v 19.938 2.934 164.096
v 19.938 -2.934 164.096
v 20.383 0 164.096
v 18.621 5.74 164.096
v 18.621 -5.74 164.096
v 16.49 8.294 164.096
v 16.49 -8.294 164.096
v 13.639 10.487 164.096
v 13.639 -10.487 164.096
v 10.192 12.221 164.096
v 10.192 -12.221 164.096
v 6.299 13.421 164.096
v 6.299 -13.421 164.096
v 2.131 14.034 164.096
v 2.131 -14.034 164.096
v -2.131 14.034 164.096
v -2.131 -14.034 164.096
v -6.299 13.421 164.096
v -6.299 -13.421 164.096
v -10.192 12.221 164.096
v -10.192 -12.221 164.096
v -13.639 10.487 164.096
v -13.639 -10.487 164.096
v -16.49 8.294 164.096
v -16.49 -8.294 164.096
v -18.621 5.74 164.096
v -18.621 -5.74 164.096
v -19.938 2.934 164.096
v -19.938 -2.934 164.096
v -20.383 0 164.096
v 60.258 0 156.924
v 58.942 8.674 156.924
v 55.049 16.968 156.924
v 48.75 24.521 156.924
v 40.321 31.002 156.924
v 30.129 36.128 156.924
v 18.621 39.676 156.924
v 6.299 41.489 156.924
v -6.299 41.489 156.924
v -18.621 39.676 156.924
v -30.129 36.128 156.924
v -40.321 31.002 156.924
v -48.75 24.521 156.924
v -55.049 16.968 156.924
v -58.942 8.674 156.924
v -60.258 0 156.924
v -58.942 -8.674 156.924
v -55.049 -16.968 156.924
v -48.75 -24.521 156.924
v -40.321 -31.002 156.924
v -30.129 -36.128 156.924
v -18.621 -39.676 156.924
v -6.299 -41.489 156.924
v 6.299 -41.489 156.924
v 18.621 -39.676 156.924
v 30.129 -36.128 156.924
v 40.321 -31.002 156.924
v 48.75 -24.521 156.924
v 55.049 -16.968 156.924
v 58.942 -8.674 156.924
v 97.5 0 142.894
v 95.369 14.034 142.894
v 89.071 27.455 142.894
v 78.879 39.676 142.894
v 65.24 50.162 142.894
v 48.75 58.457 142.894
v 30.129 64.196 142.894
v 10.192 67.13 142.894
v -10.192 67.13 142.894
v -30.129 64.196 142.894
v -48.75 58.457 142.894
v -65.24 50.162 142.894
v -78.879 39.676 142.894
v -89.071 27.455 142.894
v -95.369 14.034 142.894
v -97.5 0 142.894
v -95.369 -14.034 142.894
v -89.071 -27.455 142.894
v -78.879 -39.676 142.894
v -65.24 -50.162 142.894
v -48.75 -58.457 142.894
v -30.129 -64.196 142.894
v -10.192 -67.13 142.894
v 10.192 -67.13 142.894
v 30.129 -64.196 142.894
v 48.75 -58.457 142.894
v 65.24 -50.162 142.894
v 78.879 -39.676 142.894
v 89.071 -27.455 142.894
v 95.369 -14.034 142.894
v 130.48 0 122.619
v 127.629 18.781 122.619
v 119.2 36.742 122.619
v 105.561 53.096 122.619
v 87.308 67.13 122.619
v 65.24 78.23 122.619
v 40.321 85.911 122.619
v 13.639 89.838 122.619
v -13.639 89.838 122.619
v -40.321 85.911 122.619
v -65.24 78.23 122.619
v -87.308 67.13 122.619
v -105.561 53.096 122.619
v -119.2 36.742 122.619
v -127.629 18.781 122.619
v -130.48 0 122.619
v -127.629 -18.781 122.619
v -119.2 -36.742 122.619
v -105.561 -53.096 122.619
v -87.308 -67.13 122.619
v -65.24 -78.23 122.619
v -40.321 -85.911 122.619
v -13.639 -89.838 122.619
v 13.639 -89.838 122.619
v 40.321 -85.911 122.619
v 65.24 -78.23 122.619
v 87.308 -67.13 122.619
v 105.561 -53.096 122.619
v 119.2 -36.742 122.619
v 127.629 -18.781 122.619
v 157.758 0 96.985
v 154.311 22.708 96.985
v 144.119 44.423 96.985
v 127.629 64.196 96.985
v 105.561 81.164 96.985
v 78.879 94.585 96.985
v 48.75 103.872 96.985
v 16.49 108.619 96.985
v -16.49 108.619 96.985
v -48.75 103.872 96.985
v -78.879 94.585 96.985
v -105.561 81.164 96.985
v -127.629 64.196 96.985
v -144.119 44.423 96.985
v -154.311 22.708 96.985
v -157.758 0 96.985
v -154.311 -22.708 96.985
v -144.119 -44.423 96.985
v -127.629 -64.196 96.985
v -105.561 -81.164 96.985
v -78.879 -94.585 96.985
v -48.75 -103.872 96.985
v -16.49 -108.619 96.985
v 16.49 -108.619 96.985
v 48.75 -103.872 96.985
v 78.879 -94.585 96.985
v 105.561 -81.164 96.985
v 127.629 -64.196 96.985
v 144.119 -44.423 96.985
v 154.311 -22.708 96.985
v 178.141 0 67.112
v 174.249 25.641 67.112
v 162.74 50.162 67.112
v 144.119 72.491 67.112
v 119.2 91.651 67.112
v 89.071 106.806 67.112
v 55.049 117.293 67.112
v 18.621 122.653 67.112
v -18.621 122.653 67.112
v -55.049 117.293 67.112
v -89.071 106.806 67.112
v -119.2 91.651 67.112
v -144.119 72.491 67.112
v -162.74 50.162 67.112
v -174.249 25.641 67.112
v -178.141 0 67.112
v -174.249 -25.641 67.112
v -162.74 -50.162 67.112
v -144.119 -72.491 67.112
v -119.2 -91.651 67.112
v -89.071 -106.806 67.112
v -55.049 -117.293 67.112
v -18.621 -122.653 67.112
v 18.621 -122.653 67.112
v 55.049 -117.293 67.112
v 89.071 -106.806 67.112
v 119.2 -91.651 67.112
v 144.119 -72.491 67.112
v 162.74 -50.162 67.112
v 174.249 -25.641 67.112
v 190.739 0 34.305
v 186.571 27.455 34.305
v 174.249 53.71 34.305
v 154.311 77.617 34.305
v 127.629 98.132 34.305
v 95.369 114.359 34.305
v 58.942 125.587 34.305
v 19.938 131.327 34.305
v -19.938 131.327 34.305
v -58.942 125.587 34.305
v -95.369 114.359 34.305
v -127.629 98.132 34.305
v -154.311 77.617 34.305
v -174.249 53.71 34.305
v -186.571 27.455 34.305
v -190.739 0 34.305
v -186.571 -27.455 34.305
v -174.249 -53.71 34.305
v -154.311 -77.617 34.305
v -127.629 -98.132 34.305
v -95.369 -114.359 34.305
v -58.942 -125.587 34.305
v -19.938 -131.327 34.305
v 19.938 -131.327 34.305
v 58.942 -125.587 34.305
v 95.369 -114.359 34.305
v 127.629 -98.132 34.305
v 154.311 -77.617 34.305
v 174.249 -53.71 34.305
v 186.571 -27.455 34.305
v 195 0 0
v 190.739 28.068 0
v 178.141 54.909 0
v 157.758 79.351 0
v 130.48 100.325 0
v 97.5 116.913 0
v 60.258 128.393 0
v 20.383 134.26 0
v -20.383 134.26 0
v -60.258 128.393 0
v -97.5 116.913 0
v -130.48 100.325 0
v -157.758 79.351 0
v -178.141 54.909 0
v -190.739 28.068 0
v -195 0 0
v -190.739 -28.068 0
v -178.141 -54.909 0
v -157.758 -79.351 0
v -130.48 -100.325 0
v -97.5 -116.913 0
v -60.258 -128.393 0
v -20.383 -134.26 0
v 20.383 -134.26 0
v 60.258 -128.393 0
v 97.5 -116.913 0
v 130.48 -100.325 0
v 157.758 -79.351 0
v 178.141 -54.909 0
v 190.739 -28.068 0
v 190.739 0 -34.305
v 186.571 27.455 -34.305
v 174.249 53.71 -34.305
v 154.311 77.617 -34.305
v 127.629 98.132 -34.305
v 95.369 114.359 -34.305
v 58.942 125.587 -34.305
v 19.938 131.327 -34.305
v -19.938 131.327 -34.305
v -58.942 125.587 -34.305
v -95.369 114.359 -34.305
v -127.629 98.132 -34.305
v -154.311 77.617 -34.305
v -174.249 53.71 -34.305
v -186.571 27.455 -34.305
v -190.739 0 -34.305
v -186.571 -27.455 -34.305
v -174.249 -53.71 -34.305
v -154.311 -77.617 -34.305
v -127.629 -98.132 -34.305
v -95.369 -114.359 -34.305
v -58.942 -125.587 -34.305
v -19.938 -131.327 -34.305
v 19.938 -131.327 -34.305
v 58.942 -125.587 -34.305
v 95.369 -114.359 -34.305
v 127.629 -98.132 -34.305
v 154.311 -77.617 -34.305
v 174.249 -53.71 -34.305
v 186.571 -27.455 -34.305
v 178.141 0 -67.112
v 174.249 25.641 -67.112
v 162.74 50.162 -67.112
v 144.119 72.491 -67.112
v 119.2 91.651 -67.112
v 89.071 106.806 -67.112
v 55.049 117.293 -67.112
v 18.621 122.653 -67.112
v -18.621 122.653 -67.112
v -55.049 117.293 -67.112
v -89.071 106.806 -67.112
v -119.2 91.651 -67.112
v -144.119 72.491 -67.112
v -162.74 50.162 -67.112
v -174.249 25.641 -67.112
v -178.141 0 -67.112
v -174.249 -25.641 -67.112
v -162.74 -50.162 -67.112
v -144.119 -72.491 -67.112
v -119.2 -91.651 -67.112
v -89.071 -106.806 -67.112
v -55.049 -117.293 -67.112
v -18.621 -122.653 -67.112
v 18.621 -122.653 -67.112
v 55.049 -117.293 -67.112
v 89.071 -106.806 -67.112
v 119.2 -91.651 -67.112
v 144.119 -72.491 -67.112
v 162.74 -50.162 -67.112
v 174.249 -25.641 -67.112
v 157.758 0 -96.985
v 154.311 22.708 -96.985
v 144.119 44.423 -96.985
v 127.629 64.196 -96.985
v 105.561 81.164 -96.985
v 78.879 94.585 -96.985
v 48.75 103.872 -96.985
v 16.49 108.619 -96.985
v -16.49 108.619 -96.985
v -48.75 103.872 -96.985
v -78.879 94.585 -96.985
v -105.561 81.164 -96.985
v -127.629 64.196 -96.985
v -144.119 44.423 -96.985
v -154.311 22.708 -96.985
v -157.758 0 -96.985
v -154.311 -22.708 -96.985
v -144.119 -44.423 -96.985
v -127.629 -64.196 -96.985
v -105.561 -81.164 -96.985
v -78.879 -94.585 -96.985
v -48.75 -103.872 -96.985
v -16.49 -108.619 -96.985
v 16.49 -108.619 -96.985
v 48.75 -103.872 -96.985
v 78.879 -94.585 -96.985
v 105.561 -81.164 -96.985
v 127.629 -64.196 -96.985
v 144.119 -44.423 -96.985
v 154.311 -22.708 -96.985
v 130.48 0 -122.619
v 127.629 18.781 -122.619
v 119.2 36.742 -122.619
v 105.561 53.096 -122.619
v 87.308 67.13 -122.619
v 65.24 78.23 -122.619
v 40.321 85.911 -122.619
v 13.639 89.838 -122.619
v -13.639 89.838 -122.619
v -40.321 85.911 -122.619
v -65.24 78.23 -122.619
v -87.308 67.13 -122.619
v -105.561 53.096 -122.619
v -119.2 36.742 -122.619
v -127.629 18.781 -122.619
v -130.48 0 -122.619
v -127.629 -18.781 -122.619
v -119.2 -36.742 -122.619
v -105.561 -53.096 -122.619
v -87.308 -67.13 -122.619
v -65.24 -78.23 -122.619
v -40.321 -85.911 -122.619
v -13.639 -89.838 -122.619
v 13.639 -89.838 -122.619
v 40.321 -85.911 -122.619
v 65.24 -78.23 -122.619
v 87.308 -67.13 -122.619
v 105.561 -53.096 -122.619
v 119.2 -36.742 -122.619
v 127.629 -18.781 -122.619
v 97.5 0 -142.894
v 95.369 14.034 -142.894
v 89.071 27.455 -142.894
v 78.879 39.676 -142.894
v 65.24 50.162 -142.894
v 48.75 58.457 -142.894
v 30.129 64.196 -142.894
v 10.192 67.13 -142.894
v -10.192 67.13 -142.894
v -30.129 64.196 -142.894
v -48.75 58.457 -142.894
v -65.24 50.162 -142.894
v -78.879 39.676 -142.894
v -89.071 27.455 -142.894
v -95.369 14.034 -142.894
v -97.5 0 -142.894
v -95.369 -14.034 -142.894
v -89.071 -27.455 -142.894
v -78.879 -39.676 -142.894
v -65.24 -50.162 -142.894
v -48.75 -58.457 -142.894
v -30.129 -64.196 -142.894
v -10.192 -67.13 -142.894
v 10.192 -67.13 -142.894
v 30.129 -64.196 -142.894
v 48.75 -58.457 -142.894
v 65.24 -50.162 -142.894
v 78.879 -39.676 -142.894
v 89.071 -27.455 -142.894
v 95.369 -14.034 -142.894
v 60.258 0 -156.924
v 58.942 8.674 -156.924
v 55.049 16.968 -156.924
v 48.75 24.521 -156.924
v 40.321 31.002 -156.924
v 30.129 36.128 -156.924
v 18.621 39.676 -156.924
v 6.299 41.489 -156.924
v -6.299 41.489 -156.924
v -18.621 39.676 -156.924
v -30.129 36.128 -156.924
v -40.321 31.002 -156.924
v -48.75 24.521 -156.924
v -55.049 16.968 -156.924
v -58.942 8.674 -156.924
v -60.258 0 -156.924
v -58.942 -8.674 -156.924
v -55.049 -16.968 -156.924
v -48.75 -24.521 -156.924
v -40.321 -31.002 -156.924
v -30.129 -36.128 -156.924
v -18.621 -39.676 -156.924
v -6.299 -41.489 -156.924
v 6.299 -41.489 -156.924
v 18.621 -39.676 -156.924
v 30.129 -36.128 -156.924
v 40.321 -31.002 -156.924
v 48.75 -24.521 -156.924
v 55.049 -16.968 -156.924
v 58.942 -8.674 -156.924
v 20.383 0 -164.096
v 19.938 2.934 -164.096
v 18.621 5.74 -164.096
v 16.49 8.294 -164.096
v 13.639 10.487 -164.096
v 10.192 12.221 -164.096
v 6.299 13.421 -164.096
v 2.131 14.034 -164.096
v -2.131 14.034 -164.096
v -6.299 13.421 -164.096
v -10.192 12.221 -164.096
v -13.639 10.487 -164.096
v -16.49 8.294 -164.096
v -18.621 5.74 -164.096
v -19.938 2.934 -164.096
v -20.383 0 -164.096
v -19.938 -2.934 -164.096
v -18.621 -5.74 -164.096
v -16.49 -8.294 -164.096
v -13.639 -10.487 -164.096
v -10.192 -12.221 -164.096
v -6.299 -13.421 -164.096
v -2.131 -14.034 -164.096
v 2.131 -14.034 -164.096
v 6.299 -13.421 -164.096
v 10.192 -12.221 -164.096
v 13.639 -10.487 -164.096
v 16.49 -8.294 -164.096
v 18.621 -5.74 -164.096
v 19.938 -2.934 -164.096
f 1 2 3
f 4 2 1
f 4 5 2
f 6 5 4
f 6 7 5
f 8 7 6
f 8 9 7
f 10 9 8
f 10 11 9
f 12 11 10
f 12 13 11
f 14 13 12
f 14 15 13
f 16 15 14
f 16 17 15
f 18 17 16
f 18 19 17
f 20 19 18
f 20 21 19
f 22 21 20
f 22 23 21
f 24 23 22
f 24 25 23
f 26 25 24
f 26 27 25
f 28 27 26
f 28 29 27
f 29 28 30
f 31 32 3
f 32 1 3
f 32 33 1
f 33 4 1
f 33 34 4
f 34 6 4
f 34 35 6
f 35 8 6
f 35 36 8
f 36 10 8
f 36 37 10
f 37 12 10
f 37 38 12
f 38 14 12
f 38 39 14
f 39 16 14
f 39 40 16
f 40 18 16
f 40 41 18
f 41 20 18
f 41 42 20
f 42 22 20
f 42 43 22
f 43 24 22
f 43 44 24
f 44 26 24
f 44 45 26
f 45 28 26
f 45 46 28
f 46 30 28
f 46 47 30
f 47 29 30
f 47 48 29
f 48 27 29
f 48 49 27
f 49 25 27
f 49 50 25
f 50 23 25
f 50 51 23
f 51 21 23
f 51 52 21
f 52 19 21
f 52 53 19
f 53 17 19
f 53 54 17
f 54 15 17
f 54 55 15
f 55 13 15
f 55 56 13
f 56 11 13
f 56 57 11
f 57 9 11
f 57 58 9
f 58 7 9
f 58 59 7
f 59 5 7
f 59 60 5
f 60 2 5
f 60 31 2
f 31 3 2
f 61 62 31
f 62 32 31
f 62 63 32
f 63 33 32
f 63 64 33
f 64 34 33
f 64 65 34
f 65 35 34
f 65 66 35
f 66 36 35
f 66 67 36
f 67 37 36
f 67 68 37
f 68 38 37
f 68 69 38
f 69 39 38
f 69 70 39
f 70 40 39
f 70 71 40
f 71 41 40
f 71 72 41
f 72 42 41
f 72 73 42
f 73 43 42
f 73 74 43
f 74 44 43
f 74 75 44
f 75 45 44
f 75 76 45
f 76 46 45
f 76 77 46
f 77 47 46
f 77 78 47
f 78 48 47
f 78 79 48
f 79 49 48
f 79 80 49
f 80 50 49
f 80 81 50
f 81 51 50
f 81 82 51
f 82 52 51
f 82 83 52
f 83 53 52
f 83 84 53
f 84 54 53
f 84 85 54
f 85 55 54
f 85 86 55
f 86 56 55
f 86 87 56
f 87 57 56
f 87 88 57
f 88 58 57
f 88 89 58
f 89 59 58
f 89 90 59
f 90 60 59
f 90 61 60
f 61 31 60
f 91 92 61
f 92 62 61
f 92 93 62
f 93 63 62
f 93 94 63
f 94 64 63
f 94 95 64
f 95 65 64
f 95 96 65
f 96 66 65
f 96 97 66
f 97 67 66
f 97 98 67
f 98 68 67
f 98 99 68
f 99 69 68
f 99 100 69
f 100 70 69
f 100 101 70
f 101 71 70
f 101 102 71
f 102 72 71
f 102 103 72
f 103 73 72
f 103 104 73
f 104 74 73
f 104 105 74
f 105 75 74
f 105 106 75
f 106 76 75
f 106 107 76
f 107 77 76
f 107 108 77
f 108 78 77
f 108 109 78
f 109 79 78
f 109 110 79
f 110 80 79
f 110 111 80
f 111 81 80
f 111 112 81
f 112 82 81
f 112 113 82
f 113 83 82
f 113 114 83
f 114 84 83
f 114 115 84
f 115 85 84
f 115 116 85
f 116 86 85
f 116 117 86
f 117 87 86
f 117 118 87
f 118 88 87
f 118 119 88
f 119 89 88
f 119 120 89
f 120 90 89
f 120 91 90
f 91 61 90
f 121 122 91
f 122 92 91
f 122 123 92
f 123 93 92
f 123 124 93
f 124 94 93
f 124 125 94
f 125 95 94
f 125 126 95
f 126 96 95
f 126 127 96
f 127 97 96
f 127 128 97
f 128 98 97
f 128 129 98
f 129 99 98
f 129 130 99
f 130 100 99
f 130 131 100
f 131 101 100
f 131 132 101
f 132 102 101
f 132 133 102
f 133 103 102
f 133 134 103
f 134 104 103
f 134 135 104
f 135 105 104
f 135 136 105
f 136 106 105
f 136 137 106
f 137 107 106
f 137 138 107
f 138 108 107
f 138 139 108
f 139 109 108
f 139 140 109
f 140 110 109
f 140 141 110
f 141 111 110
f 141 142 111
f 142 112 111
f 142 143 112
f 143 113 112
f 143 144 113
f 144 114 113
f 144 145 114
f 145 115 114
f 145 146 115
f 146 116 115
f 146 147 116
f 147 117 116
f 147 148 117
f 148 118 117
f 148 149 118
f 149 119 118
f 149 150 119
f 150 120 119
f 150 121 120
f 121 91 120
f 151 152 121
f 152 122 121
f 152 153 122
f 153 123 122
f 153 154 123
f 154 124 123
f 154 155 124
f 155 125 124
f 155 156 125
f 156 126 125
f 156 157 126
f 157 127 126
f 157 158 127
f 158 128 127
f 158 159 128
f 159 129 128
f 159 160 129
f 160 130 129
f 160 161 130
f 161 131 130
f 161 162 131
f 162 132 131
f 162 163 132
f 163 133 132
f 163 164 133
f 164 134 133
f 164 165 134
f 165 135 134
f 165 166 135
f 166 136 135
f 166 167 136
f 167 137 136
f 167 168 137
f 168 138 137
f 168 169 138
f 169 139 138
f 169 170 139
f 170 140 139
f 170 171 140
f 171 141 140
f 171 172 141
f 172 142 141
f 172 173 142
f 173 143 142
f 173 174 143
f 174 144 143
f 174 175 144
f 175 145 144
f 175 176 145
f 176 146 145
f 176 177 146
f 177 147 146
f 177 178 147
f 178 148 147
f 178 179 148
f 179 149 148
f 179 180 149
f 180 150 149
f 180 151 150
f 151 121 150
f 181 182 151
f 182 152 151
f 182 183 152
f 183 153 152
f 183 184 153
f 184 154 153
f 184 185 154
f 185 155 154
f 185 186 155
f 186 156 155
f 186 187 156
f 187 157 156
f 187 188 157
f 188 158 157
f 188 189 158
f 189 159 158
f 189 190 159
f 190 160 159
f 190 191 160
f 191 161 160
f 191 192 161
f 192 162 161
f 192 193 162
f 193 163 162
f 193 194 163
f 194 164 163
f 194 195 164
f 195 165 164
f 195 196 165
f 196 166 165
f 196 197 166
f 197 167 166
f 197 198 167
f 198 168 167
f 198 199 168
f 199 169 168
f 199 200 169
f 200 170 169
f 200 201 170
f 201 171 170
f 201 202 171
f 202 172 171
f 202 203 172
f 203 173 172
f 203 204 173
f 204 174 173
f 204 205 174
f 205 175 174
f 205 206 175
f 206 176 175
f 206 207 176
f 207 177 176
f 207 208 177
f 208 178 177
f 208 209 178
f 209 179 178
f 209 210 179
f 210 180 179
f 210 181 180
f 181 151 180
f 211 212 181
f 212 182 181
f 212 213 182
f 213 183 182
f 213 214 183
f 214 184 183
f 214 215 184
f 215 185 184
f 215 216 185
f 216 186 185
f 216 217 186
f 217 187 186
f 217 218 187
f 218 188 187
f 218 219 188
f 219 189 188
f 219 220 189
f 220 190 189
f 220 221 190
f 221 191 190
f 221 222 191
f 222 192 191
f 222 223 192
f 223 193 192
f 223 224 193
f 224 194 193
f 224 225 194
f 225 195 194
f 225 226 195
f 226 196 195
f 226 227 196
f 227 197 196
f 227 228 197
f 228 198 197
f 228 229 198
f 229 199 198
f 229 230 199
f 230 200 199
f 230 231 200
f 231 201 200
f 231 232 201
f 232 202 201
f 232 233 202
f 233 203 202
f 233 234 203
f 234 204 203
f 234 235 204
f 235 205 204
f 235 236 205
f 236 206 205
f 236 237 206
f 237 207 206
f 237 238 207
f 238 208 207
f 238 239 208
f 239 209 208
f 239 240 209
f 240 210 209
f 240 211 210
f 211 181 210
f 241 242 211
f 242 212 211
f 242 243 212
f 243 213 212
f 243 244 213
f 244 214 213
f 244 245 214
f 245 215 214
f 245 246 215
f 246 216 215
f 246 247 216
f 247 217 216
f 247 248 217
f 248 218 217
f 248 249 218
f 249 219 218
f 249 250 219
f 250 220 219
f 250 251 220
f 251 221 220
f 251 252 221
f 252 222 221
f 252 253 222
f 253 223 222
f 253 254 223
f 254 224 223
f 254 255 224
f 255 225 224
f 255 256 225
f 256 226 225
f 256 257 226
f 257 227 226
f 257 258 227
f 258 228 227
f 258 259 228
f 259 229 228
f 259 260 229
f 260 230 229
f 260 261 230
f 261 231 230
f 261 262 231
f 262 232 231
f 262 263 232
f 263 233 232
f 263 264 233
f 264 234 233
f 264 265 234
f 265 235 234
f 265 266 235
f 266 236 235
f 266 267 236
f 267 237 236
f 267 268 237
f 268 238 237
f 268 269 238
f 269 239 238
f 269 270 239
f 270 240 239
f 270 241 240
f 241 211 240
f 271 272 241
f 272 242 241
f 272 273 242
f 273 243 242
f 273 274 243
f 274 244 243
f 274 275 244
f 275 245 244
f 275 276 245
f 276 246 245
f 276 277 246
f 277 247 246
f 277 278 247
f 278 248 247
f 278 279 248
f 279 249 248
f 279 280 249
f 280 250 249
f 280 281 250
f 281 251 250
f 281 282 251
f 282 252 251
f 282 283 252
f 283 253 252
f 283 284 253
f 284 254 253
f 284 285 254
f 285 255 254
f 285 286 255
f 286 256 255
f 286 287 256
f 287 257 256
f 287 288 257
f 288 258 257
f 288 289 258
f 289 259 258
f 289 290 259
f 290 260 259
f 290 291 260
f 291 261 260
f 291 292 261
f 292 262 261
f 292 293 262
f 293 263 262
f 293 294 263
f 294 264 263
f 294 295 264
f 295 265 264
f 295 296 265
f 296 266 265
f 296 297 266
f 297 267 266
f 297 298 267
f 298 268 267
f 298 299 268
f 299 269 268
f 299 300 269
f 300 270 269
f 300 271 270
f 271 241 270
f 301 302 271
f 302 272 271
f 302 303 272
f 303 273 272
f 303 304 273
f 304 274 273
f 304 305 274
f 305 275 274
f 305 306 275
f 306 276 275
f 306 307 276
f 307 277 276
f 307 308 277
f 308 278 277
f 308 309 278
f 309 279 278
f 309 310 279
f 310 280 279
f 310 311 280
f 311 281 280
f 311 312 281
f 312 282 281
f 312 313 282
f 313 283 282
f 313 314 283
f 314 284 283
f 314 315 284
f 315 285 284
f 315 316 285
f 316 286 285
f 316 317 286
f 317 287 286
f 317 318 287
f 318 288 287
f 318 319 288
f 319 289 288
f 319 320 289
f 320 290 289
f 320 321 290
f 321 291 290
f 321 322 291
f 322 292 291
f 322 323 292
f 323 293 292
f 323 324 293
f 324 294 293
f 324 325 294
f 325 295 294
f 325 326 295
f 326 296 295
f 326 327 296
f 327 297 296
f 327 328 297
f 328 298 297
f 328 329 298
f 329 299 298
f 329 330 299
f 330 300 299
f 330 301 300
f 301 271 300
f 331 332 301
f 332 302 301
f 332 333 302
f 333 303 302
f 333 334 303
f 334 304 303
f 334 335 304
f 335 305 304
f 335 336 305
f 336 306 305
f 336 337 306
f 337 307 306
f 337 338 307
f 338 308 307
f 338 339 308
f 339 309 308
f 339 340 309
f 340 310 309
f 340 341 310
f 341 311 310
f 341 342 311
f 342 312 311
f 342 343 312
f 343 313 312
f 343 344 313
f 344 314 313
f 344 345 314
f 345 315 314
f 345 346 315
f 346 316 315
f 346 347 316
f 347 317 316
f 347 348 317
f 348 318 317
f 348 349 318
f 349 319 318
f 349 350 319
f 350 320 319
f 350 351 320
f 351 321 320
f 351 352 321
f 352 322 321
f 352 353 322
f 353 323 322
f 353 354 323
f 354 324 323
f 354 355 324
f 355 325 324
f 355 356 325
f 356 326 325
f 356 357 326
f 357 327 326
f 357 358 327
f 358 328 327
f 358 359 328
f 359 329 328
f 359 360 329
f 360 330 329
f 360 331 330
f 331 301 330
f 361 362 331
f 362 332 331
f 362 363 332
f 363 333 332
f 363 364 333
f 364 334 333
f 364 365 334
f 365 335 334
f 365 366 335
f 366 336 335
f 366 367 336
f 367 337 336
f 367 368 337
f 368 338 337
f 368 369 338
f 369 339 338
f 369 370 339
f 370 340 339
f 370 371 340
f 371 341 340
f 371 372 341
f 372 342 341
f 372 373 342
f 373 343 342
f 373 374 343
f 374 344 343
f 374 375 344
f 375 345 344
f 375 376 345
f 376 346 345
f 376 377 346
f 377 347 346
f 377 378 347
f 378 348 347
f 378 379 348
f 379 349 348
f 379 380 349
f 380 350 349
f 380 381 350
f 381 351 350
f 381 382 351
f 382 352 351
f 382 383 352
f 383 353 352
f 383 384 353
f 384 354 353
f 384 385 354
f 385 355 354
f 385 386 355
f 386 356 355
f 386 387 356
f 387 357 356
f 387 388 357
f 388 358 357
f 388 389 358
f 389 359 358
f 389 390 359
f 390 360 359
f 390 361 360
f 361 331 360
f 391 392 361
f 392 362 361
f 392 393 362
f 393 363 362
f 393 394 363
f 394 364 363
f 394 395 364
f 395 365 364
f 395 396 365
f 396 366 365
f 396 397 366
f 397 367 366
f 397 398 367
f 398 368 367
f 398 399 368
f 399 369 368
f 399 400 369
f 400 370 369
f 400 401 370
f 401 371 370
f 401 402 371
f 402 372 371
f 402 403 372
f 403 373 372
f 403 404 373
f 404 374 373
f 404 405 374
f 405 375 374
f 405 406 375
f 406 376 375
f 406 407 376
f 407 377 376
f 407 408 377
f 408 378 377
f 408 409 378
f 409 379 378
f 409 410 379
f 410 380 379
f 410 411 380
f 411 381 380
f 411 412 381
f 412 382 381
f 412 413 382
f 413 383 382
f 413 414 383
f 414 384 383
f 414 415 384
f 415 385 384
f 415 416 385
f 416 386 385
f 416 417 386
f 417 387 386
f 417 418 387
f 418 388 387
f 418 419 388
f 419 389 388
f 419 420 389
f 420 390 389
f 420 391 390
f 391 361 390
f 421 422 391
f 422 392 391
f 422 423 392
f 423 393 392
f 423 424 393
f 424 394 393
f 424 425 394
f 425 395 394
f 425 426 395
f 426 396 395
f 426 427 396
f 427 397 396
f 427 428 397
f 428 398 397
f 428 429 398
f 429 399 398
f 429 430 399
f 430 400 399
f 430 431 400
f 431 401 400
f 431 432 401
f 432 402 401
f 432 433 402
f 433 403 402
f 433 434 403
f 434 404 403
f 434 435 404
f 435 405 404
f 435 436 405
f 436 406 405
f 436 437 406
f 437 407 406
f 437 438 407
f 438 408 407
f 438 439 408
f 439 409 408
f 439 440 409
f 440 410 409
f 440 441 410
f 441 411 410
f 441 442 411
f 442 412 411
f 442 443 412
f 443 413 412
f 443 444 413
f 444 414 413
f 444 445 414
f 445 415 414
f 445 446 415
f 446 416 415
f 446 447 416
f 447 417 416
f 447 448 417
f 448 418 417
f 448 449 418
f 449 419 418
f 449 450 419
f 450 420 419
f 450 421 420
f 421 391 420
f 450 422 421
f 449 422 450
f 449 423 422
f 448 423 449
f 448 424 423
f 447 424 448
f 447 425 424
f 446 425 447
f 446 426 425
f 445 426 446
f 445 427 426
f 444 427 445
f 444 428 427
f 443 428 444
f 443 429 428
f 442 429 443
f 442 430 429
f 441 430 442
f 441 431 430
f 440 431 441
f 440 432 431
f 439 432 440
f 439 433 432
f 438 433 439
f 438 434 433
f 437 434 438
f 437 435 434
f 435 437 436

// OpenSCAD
// Generated by SolidPython 1.0.1 on 2020-07-29 00:46:50


scale(v = [13, 9, 11]) {
	sphere(r = 15);
}
/***********************************************
*********      SolidPython code:      **********
************************************************
 
# import packages: SolidPython
from solid import *
from solid.utils import *
from itertools import chain, combinations, permutations


class Resize:

    def __init__(self, scad_file):
        self.scad_file = scad_file
        #self.scad_file = import_scad(scad_file)
        # cone/cylinder param:
        self.r1 = 0
        self.r2 = 0
        self.h = 0
        # rectangular prism param:
        self.w = 0
        self.l = 0
        # ellipse param:
        self.r = 0

    # import OpenScad code (file name corresponds to shape)


    # classify shape + parameters
    def assign(self, param1, param2, param3):
        if self.scad_file == 'cone.scad':
            self.r1 = param1
            self.r2 = param2
            self.h = param3
        elif self.scad_file == 'cylinder.scad':
            self.r1 = param1
            self.r2 = param2
            self.h = param3
        elif self.scad_file == 'rectangularPrism.scad':
            self.h = param1
            self.l = param2
            self.w = param3
        else:
            self.r = param1
            self.h = param2

    # resize parameters
    def iterate(self):
        x = range(3, 20, 2)
        i = 1
        if self.scad_file == 'cone.scad':
            tempList = list(permutations(x, 2))
            for temp in tempList:
                param1 = temp[0]
                param2 = temp[1]
                filepath = 'produced_scad_files/' + 'cone' + str(param1) + '_' + str(param2) + '_' + '.scad'
                scad_render_to_file(cylinder(h=param1, r1=param2, r2=0), filepath)

        elif self.scad_file == 'cylinder.scad':
            tempList = list(permutations(x, 3))
            for temp in tempList:
                param1 = temp[0]
                param2 = temp[1]
                filepath = 'produced_scad_files/' + 'cylinder' + str(param1) + '_' + str(param2) + '_' + '.scad'
                scad_render_to_file(cylinder(h=param1, r1=param2, r2=param2), filepath)

        elif self.scad_file == 'rectangularPrism.scad':
            tempList = list(permutations(x, 3))
            for temp in tempList:
                param1 = temp[0]
                param2 = temp[1]
                param3 = temp[2]
                filepath = 'produced_scad_files/' + 'rectangularPrism' + str(param1) + '_' + str(param2) + '_' + str(
                    param3) + '.scad'
                scad_render_to_file(cube(size=(param1, param2, param3)), filepath)

        elif self.scad_file == 'ellipse.scad':
            tempList = list(permutations(x, 4))
            for temp in tempList:
                param1 = temp[0]
                param2 = temp[1]
                param3 = temp[2]
                param4 = temp[3]
                filepath = 'produced_scad_files/' + 'ellipse' + str(param1) + '_' + str(param2) + '_' + str(param3) + '_' + str(param4) + '.scad'
                scad_render_to_file(scale([param1, param2, param3])(sphere(r=param4)), filepath)

    def render_to_scadfile(self):
        scad_render_to_file(scad, 'example.scad') 
 
************************************************/
